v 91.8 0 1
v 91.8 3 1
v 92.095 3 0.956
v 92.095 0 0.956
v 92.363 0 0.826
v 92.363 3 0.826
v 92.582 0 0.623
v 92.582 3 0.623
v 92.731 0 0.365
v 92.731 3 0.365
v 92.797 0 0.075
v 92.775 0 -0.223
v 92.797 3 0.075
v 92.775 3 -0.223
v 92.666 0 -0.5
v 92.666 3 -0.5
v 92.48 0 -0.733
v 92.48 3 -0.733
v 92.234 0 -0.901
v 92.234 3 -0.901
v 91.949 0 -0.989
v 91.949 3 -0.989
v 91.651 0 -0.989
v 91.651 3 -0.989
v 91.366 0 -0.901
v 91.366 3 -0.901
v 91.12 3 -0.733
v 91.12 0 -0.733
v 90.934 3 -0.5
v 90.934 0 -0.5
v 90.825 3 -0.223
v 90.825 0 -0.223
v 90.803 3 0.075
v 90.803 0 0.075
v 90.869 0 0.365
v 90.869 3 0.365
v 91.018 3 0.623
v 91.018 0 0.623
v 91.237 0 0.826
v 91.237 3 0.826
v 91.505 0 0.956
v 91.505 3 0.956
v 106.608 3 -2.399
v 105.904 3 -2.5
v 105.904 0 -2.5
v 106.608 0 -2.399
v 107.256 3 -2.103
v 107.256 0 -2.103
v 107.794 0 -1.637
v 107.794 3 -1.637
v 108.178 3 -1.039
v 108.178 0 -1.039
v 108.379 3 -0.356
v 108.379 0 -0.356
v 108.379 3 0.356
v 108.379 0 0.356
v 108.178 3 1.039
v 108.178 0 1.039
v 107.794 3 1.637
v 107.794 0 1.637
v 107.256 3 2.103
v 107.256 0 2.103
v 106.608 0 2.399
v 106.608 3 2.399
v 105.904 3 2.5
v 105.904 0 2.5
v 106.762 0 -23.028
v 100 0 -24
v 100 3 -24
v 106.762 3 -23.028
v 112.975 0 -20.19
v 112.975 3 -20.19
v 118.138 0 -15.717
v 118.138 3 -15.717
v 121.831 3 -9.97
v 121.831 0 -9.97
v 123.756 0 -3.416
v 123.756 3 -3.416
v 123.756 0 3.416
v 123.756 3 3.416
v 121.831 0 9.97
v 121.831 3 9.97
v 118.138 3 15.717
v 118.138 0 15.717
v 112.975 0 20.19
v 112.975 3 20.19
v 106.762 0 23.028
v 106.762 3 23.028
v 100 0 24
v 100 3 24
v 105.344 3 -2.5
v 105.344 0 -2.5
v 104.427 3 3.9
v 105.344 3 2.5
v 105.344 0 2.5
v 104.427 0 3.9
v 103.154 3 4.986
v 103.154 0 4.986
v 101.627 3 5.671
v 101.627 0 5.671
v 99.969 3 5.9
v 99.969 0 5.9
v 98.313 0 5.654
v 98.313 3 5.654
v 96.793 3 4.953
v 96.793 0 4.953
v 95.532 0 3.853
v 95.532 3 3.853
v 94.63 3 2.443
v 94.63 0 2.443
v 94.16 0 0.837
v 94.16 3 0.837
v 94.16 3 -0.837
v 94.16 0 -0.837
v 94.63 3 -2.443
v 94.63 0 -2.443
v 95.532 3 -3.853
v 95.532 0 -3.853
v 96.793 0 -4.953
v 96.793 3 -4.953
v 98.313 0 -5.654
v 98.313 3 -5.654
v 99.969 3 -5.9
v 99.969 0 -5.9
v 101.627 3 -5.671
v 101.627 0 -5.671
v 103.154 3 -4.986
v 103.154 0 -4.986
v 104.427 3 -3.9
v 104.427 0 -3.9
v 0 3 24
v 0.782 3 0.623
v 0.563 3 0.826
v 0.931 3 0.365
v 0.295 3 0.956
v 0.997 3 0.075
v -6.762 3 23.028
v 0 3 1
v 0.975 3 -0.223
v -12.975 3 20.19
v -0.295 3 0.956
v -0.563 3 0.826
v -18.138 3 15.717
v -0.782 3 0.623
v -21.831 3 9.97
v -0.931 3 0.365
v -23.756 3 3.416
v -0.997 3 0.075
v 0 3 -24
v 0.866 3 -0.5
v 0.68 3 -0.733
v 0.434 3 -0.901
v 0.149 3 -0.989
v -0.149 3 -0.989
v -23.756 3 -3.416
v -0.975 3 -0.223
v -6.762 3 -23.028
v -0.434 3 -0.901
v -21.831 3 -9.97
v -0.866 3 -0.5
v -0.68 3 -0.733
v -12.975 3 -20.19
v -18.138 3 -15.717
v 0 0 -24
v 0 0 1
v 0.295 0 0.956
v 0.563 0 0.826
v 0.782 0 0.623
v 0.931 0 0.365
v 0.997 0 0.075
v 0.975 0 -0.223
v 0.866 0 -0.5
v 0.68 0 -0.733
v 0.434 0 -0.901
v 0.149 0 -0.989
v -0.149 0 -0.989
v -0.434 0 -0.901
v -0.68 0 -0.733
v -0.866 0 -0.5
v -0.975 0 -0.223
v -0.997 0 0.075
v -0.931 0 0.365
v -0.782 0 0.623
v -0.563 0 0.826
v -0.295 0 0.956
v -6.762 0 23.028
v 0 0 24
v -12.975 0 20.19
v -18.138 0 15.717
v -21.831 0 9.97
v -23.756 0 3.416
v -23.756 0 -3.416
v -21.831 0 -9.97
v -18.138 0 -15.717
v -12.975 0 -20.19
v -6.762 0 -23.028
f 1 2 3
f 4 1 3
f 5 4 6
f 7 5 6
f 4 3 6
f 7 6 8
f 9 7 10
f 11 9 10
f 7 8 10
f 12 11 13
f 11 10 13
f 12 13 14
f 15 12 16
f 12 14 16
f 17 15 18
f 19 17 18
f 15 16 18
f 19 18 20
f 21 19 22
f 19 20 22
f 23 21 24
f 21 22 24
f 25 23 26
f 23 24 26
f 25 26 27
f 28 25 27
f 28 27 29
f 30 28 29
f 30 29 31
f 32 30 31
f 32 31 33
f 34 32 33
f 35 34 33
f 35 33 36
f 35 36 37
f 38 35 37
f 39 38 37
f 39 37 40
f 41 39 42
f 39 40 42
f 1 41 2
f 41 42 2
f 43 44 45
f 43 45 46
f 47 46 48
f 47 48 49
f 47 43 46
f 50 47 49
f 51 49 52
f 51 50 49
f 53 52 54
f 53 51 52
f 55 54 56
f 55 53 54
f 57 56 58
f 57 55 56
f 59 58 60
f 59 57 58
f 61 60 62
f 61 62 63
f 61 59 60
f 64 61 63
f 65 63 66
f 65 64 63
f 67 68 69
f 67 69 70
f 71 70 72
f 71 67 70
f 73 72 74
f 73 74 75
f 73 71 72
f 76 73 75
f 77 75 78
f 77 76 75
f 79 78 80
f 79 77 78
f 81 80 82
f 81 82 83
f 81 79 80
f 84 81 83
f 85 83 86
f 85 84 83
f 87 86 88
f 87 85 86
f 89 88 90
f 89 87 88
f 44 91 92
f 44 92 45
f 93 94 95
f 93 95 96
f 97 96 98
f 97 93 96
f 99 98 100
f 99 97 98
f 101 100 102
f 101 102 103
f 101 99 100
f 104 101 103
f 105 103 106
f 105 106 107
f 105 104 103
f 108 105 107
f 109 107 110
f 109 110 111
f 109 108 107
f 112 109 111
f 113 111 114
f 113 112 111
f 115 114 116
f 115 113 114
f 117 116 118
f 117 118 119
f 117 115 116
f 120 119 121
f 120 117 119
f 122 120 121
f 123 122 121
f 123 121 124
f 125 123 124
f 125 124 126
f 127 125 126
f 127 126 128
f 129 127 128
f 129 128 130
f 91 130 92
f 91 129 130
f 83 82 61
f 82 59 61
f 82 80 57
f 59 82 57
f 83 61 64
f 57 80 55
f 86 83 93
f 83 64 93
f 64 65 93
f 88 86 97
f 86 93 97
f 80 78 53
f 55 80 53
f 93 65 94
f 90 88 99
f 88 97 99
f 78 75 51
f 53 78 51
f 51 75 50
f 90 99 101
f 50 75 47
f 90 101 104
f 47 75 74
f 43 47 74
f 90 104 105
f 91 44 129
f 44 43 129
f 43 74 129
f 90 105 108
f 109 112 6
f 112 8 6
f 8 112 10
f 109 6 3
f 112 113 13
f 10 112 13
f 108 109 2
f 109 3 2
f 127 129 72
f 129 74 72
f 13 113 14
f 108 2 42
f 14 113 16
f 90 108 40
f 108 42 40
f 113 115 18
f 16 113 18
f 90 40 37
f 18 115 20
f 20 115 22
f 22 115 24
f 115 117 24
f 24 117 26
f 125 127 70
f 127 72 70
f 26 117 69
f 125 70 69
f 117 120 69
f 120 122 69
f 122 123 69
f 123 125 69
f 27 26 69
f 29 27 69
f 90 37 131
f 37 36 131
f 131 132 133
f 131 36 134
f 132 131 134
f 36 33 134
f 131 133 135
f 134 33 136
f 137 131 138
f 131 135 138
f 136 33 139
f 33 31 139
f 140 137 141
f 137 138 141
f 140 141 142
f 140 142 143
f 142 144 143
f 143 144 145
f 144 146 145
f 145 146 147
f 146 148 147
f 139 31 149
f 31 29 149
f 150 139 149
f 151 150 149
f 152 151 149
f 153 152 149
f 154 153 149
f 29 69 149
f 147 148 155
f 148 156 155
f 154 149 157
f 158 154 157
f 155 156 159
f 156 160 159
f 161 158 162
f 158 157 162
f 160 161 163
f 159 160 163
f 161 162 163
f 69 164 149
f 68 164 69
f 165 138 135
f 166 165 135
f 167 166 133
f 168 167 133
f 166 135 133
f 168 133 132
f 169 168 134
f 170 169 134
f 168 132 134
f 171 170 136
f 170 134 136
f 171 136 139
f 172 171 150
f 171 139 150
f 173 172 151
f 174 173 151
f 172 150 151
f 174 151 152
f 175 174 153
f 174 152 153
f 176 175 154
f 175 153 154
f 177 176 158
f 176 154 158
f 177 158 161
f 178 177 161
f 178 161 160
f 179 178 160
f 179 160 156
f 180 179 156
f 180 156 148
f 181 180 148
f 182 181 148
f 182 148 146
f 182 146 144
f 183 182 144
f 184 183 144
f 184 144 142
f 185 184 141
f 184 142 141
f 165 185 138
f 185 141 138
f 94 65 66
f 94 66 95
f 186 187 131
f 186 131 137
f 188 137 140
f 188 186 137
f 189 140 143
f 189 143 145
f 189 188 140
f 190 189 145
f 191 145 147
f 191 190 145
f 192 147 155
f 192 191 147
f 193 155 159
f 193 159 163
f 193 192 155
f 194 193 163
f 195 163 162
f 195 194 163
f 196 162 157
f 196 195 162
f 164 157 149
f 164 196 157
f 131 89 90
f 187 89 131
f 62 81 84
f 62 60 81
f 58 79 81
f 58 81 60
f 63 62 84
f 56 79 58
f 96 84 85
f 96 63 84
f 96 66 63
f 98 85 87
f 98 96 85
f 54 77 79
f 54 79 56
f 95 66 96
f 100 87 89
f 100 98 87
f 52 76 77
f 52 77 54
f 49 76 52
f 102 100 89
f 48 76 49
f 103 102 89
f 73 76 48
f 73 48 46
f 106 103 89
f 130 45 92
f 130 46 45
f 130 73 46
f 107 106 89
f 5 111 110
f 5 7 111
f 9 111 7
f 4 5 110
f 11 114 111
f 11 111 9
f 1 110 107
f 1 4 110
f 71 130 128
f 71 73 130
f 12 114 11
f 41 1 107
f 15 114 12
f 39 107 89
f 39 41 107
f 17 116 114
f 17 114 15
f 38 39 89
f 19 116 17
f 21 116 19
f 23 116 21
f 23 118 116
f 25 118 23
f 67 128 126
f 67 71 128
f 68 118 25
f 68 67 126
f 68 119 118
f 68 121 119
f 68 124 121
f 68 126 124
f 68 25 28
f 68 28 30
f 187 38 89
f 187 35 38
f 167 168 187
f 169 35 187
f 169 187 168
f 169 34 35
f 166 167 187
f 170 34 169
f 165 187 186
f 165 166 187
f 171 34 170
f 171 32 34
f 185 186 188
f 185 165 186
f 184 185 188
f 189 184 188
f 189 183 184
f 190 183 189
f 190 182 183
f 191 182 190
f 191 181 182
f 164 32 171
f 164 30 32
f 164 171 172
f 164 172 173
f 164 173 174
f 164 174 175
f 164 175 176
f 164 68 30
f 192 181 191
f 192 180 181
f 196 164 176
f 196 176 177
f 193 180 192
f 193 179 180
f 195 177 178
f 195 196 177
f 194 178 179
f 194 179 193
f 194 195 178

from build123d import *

# Parameters (mm, degrees)
BOSS_EXTRUDE1_DEPTH = 3
SKETCH2_R           = 1
CUT_EXTRUDE1_DEPTH  = 3
CUT_EXTRUDE2_DEPTH  = 3
SKETCH4_R           = 1
CUT_EXTRUDE3_DEPTH  = 3


with BuildPart() as part:
    # Sketch1 → Boss-Extrude1 (new body)
    with BuildSketch(Plane(origin=(0, 0, 0), x_dir=(1, 0, 0), z_dir=(0, 1, 0))):
        with BuildLine():
            Line((0, 24), (100, 24))
            ThreePointArc((100, 24), (124, 0), (100, -24))
            Line((100, -24), (0, -24))
            ThreePointArc((0, -24), (-24, 0), (0, 24))
        make_face()
    extrude(amount=BOSS_EXTRUDE1_DEPTH)

    # Sketch2 → Cut-Extrude1 (cut)
    with BuildSketch(Plane(origin=(0, 3, 0), x_dir=(1, 0, 0), z_dir=(0, 1, 0))):
        with Locations(Location((0, 0, 0), (0, 0, 270))):
            Circle(SKETCH2_R)
    extrude(amount=-CUT_EXTRUDE1_DEPTH, mode=Mode.SUBTRACT)

    # Sketch3 → Cut-Extrude2 (cut)
    with BuildSketch(Plane(origin=(0, 3, 0), x_dir=(1, 0, 0), z_dir=(0, 1, 0))):
        with BuildLine():
            Line((105.344155686, 2.5), (105.904155686, 2.5))
            ThreePointArc((105.904155686, 2.5), (108.404155686, 0), (105.904155686, -2.5))
            Line((105.904155686, -2.5), (105.344155686, -2.5))
            ThreePointArc((105.344155686, -2.5), (94.1, 0), (105.344155686, 2.5))
        make_face()
    extrude(amount=-CUT_EXTRUDE2_DEPTH, mode=Mode.SUBTRACT)

    # Sketch4 → Cut-Extrude3 (cut)
    with BuildSketch(Plane(origin=(0, 3, 0), x_dir=(1, 0, 0), z_dir=(0, 1, 0))):
        with Locations(Location((91.8, 0, 0), (0, 0, 270))):
            Circle(SKETCH4_R)
    extrude(amount=-CUT_EXTRUDE3_DEPTH, mode=Mode.SUBTRACT)


solid = part.part
